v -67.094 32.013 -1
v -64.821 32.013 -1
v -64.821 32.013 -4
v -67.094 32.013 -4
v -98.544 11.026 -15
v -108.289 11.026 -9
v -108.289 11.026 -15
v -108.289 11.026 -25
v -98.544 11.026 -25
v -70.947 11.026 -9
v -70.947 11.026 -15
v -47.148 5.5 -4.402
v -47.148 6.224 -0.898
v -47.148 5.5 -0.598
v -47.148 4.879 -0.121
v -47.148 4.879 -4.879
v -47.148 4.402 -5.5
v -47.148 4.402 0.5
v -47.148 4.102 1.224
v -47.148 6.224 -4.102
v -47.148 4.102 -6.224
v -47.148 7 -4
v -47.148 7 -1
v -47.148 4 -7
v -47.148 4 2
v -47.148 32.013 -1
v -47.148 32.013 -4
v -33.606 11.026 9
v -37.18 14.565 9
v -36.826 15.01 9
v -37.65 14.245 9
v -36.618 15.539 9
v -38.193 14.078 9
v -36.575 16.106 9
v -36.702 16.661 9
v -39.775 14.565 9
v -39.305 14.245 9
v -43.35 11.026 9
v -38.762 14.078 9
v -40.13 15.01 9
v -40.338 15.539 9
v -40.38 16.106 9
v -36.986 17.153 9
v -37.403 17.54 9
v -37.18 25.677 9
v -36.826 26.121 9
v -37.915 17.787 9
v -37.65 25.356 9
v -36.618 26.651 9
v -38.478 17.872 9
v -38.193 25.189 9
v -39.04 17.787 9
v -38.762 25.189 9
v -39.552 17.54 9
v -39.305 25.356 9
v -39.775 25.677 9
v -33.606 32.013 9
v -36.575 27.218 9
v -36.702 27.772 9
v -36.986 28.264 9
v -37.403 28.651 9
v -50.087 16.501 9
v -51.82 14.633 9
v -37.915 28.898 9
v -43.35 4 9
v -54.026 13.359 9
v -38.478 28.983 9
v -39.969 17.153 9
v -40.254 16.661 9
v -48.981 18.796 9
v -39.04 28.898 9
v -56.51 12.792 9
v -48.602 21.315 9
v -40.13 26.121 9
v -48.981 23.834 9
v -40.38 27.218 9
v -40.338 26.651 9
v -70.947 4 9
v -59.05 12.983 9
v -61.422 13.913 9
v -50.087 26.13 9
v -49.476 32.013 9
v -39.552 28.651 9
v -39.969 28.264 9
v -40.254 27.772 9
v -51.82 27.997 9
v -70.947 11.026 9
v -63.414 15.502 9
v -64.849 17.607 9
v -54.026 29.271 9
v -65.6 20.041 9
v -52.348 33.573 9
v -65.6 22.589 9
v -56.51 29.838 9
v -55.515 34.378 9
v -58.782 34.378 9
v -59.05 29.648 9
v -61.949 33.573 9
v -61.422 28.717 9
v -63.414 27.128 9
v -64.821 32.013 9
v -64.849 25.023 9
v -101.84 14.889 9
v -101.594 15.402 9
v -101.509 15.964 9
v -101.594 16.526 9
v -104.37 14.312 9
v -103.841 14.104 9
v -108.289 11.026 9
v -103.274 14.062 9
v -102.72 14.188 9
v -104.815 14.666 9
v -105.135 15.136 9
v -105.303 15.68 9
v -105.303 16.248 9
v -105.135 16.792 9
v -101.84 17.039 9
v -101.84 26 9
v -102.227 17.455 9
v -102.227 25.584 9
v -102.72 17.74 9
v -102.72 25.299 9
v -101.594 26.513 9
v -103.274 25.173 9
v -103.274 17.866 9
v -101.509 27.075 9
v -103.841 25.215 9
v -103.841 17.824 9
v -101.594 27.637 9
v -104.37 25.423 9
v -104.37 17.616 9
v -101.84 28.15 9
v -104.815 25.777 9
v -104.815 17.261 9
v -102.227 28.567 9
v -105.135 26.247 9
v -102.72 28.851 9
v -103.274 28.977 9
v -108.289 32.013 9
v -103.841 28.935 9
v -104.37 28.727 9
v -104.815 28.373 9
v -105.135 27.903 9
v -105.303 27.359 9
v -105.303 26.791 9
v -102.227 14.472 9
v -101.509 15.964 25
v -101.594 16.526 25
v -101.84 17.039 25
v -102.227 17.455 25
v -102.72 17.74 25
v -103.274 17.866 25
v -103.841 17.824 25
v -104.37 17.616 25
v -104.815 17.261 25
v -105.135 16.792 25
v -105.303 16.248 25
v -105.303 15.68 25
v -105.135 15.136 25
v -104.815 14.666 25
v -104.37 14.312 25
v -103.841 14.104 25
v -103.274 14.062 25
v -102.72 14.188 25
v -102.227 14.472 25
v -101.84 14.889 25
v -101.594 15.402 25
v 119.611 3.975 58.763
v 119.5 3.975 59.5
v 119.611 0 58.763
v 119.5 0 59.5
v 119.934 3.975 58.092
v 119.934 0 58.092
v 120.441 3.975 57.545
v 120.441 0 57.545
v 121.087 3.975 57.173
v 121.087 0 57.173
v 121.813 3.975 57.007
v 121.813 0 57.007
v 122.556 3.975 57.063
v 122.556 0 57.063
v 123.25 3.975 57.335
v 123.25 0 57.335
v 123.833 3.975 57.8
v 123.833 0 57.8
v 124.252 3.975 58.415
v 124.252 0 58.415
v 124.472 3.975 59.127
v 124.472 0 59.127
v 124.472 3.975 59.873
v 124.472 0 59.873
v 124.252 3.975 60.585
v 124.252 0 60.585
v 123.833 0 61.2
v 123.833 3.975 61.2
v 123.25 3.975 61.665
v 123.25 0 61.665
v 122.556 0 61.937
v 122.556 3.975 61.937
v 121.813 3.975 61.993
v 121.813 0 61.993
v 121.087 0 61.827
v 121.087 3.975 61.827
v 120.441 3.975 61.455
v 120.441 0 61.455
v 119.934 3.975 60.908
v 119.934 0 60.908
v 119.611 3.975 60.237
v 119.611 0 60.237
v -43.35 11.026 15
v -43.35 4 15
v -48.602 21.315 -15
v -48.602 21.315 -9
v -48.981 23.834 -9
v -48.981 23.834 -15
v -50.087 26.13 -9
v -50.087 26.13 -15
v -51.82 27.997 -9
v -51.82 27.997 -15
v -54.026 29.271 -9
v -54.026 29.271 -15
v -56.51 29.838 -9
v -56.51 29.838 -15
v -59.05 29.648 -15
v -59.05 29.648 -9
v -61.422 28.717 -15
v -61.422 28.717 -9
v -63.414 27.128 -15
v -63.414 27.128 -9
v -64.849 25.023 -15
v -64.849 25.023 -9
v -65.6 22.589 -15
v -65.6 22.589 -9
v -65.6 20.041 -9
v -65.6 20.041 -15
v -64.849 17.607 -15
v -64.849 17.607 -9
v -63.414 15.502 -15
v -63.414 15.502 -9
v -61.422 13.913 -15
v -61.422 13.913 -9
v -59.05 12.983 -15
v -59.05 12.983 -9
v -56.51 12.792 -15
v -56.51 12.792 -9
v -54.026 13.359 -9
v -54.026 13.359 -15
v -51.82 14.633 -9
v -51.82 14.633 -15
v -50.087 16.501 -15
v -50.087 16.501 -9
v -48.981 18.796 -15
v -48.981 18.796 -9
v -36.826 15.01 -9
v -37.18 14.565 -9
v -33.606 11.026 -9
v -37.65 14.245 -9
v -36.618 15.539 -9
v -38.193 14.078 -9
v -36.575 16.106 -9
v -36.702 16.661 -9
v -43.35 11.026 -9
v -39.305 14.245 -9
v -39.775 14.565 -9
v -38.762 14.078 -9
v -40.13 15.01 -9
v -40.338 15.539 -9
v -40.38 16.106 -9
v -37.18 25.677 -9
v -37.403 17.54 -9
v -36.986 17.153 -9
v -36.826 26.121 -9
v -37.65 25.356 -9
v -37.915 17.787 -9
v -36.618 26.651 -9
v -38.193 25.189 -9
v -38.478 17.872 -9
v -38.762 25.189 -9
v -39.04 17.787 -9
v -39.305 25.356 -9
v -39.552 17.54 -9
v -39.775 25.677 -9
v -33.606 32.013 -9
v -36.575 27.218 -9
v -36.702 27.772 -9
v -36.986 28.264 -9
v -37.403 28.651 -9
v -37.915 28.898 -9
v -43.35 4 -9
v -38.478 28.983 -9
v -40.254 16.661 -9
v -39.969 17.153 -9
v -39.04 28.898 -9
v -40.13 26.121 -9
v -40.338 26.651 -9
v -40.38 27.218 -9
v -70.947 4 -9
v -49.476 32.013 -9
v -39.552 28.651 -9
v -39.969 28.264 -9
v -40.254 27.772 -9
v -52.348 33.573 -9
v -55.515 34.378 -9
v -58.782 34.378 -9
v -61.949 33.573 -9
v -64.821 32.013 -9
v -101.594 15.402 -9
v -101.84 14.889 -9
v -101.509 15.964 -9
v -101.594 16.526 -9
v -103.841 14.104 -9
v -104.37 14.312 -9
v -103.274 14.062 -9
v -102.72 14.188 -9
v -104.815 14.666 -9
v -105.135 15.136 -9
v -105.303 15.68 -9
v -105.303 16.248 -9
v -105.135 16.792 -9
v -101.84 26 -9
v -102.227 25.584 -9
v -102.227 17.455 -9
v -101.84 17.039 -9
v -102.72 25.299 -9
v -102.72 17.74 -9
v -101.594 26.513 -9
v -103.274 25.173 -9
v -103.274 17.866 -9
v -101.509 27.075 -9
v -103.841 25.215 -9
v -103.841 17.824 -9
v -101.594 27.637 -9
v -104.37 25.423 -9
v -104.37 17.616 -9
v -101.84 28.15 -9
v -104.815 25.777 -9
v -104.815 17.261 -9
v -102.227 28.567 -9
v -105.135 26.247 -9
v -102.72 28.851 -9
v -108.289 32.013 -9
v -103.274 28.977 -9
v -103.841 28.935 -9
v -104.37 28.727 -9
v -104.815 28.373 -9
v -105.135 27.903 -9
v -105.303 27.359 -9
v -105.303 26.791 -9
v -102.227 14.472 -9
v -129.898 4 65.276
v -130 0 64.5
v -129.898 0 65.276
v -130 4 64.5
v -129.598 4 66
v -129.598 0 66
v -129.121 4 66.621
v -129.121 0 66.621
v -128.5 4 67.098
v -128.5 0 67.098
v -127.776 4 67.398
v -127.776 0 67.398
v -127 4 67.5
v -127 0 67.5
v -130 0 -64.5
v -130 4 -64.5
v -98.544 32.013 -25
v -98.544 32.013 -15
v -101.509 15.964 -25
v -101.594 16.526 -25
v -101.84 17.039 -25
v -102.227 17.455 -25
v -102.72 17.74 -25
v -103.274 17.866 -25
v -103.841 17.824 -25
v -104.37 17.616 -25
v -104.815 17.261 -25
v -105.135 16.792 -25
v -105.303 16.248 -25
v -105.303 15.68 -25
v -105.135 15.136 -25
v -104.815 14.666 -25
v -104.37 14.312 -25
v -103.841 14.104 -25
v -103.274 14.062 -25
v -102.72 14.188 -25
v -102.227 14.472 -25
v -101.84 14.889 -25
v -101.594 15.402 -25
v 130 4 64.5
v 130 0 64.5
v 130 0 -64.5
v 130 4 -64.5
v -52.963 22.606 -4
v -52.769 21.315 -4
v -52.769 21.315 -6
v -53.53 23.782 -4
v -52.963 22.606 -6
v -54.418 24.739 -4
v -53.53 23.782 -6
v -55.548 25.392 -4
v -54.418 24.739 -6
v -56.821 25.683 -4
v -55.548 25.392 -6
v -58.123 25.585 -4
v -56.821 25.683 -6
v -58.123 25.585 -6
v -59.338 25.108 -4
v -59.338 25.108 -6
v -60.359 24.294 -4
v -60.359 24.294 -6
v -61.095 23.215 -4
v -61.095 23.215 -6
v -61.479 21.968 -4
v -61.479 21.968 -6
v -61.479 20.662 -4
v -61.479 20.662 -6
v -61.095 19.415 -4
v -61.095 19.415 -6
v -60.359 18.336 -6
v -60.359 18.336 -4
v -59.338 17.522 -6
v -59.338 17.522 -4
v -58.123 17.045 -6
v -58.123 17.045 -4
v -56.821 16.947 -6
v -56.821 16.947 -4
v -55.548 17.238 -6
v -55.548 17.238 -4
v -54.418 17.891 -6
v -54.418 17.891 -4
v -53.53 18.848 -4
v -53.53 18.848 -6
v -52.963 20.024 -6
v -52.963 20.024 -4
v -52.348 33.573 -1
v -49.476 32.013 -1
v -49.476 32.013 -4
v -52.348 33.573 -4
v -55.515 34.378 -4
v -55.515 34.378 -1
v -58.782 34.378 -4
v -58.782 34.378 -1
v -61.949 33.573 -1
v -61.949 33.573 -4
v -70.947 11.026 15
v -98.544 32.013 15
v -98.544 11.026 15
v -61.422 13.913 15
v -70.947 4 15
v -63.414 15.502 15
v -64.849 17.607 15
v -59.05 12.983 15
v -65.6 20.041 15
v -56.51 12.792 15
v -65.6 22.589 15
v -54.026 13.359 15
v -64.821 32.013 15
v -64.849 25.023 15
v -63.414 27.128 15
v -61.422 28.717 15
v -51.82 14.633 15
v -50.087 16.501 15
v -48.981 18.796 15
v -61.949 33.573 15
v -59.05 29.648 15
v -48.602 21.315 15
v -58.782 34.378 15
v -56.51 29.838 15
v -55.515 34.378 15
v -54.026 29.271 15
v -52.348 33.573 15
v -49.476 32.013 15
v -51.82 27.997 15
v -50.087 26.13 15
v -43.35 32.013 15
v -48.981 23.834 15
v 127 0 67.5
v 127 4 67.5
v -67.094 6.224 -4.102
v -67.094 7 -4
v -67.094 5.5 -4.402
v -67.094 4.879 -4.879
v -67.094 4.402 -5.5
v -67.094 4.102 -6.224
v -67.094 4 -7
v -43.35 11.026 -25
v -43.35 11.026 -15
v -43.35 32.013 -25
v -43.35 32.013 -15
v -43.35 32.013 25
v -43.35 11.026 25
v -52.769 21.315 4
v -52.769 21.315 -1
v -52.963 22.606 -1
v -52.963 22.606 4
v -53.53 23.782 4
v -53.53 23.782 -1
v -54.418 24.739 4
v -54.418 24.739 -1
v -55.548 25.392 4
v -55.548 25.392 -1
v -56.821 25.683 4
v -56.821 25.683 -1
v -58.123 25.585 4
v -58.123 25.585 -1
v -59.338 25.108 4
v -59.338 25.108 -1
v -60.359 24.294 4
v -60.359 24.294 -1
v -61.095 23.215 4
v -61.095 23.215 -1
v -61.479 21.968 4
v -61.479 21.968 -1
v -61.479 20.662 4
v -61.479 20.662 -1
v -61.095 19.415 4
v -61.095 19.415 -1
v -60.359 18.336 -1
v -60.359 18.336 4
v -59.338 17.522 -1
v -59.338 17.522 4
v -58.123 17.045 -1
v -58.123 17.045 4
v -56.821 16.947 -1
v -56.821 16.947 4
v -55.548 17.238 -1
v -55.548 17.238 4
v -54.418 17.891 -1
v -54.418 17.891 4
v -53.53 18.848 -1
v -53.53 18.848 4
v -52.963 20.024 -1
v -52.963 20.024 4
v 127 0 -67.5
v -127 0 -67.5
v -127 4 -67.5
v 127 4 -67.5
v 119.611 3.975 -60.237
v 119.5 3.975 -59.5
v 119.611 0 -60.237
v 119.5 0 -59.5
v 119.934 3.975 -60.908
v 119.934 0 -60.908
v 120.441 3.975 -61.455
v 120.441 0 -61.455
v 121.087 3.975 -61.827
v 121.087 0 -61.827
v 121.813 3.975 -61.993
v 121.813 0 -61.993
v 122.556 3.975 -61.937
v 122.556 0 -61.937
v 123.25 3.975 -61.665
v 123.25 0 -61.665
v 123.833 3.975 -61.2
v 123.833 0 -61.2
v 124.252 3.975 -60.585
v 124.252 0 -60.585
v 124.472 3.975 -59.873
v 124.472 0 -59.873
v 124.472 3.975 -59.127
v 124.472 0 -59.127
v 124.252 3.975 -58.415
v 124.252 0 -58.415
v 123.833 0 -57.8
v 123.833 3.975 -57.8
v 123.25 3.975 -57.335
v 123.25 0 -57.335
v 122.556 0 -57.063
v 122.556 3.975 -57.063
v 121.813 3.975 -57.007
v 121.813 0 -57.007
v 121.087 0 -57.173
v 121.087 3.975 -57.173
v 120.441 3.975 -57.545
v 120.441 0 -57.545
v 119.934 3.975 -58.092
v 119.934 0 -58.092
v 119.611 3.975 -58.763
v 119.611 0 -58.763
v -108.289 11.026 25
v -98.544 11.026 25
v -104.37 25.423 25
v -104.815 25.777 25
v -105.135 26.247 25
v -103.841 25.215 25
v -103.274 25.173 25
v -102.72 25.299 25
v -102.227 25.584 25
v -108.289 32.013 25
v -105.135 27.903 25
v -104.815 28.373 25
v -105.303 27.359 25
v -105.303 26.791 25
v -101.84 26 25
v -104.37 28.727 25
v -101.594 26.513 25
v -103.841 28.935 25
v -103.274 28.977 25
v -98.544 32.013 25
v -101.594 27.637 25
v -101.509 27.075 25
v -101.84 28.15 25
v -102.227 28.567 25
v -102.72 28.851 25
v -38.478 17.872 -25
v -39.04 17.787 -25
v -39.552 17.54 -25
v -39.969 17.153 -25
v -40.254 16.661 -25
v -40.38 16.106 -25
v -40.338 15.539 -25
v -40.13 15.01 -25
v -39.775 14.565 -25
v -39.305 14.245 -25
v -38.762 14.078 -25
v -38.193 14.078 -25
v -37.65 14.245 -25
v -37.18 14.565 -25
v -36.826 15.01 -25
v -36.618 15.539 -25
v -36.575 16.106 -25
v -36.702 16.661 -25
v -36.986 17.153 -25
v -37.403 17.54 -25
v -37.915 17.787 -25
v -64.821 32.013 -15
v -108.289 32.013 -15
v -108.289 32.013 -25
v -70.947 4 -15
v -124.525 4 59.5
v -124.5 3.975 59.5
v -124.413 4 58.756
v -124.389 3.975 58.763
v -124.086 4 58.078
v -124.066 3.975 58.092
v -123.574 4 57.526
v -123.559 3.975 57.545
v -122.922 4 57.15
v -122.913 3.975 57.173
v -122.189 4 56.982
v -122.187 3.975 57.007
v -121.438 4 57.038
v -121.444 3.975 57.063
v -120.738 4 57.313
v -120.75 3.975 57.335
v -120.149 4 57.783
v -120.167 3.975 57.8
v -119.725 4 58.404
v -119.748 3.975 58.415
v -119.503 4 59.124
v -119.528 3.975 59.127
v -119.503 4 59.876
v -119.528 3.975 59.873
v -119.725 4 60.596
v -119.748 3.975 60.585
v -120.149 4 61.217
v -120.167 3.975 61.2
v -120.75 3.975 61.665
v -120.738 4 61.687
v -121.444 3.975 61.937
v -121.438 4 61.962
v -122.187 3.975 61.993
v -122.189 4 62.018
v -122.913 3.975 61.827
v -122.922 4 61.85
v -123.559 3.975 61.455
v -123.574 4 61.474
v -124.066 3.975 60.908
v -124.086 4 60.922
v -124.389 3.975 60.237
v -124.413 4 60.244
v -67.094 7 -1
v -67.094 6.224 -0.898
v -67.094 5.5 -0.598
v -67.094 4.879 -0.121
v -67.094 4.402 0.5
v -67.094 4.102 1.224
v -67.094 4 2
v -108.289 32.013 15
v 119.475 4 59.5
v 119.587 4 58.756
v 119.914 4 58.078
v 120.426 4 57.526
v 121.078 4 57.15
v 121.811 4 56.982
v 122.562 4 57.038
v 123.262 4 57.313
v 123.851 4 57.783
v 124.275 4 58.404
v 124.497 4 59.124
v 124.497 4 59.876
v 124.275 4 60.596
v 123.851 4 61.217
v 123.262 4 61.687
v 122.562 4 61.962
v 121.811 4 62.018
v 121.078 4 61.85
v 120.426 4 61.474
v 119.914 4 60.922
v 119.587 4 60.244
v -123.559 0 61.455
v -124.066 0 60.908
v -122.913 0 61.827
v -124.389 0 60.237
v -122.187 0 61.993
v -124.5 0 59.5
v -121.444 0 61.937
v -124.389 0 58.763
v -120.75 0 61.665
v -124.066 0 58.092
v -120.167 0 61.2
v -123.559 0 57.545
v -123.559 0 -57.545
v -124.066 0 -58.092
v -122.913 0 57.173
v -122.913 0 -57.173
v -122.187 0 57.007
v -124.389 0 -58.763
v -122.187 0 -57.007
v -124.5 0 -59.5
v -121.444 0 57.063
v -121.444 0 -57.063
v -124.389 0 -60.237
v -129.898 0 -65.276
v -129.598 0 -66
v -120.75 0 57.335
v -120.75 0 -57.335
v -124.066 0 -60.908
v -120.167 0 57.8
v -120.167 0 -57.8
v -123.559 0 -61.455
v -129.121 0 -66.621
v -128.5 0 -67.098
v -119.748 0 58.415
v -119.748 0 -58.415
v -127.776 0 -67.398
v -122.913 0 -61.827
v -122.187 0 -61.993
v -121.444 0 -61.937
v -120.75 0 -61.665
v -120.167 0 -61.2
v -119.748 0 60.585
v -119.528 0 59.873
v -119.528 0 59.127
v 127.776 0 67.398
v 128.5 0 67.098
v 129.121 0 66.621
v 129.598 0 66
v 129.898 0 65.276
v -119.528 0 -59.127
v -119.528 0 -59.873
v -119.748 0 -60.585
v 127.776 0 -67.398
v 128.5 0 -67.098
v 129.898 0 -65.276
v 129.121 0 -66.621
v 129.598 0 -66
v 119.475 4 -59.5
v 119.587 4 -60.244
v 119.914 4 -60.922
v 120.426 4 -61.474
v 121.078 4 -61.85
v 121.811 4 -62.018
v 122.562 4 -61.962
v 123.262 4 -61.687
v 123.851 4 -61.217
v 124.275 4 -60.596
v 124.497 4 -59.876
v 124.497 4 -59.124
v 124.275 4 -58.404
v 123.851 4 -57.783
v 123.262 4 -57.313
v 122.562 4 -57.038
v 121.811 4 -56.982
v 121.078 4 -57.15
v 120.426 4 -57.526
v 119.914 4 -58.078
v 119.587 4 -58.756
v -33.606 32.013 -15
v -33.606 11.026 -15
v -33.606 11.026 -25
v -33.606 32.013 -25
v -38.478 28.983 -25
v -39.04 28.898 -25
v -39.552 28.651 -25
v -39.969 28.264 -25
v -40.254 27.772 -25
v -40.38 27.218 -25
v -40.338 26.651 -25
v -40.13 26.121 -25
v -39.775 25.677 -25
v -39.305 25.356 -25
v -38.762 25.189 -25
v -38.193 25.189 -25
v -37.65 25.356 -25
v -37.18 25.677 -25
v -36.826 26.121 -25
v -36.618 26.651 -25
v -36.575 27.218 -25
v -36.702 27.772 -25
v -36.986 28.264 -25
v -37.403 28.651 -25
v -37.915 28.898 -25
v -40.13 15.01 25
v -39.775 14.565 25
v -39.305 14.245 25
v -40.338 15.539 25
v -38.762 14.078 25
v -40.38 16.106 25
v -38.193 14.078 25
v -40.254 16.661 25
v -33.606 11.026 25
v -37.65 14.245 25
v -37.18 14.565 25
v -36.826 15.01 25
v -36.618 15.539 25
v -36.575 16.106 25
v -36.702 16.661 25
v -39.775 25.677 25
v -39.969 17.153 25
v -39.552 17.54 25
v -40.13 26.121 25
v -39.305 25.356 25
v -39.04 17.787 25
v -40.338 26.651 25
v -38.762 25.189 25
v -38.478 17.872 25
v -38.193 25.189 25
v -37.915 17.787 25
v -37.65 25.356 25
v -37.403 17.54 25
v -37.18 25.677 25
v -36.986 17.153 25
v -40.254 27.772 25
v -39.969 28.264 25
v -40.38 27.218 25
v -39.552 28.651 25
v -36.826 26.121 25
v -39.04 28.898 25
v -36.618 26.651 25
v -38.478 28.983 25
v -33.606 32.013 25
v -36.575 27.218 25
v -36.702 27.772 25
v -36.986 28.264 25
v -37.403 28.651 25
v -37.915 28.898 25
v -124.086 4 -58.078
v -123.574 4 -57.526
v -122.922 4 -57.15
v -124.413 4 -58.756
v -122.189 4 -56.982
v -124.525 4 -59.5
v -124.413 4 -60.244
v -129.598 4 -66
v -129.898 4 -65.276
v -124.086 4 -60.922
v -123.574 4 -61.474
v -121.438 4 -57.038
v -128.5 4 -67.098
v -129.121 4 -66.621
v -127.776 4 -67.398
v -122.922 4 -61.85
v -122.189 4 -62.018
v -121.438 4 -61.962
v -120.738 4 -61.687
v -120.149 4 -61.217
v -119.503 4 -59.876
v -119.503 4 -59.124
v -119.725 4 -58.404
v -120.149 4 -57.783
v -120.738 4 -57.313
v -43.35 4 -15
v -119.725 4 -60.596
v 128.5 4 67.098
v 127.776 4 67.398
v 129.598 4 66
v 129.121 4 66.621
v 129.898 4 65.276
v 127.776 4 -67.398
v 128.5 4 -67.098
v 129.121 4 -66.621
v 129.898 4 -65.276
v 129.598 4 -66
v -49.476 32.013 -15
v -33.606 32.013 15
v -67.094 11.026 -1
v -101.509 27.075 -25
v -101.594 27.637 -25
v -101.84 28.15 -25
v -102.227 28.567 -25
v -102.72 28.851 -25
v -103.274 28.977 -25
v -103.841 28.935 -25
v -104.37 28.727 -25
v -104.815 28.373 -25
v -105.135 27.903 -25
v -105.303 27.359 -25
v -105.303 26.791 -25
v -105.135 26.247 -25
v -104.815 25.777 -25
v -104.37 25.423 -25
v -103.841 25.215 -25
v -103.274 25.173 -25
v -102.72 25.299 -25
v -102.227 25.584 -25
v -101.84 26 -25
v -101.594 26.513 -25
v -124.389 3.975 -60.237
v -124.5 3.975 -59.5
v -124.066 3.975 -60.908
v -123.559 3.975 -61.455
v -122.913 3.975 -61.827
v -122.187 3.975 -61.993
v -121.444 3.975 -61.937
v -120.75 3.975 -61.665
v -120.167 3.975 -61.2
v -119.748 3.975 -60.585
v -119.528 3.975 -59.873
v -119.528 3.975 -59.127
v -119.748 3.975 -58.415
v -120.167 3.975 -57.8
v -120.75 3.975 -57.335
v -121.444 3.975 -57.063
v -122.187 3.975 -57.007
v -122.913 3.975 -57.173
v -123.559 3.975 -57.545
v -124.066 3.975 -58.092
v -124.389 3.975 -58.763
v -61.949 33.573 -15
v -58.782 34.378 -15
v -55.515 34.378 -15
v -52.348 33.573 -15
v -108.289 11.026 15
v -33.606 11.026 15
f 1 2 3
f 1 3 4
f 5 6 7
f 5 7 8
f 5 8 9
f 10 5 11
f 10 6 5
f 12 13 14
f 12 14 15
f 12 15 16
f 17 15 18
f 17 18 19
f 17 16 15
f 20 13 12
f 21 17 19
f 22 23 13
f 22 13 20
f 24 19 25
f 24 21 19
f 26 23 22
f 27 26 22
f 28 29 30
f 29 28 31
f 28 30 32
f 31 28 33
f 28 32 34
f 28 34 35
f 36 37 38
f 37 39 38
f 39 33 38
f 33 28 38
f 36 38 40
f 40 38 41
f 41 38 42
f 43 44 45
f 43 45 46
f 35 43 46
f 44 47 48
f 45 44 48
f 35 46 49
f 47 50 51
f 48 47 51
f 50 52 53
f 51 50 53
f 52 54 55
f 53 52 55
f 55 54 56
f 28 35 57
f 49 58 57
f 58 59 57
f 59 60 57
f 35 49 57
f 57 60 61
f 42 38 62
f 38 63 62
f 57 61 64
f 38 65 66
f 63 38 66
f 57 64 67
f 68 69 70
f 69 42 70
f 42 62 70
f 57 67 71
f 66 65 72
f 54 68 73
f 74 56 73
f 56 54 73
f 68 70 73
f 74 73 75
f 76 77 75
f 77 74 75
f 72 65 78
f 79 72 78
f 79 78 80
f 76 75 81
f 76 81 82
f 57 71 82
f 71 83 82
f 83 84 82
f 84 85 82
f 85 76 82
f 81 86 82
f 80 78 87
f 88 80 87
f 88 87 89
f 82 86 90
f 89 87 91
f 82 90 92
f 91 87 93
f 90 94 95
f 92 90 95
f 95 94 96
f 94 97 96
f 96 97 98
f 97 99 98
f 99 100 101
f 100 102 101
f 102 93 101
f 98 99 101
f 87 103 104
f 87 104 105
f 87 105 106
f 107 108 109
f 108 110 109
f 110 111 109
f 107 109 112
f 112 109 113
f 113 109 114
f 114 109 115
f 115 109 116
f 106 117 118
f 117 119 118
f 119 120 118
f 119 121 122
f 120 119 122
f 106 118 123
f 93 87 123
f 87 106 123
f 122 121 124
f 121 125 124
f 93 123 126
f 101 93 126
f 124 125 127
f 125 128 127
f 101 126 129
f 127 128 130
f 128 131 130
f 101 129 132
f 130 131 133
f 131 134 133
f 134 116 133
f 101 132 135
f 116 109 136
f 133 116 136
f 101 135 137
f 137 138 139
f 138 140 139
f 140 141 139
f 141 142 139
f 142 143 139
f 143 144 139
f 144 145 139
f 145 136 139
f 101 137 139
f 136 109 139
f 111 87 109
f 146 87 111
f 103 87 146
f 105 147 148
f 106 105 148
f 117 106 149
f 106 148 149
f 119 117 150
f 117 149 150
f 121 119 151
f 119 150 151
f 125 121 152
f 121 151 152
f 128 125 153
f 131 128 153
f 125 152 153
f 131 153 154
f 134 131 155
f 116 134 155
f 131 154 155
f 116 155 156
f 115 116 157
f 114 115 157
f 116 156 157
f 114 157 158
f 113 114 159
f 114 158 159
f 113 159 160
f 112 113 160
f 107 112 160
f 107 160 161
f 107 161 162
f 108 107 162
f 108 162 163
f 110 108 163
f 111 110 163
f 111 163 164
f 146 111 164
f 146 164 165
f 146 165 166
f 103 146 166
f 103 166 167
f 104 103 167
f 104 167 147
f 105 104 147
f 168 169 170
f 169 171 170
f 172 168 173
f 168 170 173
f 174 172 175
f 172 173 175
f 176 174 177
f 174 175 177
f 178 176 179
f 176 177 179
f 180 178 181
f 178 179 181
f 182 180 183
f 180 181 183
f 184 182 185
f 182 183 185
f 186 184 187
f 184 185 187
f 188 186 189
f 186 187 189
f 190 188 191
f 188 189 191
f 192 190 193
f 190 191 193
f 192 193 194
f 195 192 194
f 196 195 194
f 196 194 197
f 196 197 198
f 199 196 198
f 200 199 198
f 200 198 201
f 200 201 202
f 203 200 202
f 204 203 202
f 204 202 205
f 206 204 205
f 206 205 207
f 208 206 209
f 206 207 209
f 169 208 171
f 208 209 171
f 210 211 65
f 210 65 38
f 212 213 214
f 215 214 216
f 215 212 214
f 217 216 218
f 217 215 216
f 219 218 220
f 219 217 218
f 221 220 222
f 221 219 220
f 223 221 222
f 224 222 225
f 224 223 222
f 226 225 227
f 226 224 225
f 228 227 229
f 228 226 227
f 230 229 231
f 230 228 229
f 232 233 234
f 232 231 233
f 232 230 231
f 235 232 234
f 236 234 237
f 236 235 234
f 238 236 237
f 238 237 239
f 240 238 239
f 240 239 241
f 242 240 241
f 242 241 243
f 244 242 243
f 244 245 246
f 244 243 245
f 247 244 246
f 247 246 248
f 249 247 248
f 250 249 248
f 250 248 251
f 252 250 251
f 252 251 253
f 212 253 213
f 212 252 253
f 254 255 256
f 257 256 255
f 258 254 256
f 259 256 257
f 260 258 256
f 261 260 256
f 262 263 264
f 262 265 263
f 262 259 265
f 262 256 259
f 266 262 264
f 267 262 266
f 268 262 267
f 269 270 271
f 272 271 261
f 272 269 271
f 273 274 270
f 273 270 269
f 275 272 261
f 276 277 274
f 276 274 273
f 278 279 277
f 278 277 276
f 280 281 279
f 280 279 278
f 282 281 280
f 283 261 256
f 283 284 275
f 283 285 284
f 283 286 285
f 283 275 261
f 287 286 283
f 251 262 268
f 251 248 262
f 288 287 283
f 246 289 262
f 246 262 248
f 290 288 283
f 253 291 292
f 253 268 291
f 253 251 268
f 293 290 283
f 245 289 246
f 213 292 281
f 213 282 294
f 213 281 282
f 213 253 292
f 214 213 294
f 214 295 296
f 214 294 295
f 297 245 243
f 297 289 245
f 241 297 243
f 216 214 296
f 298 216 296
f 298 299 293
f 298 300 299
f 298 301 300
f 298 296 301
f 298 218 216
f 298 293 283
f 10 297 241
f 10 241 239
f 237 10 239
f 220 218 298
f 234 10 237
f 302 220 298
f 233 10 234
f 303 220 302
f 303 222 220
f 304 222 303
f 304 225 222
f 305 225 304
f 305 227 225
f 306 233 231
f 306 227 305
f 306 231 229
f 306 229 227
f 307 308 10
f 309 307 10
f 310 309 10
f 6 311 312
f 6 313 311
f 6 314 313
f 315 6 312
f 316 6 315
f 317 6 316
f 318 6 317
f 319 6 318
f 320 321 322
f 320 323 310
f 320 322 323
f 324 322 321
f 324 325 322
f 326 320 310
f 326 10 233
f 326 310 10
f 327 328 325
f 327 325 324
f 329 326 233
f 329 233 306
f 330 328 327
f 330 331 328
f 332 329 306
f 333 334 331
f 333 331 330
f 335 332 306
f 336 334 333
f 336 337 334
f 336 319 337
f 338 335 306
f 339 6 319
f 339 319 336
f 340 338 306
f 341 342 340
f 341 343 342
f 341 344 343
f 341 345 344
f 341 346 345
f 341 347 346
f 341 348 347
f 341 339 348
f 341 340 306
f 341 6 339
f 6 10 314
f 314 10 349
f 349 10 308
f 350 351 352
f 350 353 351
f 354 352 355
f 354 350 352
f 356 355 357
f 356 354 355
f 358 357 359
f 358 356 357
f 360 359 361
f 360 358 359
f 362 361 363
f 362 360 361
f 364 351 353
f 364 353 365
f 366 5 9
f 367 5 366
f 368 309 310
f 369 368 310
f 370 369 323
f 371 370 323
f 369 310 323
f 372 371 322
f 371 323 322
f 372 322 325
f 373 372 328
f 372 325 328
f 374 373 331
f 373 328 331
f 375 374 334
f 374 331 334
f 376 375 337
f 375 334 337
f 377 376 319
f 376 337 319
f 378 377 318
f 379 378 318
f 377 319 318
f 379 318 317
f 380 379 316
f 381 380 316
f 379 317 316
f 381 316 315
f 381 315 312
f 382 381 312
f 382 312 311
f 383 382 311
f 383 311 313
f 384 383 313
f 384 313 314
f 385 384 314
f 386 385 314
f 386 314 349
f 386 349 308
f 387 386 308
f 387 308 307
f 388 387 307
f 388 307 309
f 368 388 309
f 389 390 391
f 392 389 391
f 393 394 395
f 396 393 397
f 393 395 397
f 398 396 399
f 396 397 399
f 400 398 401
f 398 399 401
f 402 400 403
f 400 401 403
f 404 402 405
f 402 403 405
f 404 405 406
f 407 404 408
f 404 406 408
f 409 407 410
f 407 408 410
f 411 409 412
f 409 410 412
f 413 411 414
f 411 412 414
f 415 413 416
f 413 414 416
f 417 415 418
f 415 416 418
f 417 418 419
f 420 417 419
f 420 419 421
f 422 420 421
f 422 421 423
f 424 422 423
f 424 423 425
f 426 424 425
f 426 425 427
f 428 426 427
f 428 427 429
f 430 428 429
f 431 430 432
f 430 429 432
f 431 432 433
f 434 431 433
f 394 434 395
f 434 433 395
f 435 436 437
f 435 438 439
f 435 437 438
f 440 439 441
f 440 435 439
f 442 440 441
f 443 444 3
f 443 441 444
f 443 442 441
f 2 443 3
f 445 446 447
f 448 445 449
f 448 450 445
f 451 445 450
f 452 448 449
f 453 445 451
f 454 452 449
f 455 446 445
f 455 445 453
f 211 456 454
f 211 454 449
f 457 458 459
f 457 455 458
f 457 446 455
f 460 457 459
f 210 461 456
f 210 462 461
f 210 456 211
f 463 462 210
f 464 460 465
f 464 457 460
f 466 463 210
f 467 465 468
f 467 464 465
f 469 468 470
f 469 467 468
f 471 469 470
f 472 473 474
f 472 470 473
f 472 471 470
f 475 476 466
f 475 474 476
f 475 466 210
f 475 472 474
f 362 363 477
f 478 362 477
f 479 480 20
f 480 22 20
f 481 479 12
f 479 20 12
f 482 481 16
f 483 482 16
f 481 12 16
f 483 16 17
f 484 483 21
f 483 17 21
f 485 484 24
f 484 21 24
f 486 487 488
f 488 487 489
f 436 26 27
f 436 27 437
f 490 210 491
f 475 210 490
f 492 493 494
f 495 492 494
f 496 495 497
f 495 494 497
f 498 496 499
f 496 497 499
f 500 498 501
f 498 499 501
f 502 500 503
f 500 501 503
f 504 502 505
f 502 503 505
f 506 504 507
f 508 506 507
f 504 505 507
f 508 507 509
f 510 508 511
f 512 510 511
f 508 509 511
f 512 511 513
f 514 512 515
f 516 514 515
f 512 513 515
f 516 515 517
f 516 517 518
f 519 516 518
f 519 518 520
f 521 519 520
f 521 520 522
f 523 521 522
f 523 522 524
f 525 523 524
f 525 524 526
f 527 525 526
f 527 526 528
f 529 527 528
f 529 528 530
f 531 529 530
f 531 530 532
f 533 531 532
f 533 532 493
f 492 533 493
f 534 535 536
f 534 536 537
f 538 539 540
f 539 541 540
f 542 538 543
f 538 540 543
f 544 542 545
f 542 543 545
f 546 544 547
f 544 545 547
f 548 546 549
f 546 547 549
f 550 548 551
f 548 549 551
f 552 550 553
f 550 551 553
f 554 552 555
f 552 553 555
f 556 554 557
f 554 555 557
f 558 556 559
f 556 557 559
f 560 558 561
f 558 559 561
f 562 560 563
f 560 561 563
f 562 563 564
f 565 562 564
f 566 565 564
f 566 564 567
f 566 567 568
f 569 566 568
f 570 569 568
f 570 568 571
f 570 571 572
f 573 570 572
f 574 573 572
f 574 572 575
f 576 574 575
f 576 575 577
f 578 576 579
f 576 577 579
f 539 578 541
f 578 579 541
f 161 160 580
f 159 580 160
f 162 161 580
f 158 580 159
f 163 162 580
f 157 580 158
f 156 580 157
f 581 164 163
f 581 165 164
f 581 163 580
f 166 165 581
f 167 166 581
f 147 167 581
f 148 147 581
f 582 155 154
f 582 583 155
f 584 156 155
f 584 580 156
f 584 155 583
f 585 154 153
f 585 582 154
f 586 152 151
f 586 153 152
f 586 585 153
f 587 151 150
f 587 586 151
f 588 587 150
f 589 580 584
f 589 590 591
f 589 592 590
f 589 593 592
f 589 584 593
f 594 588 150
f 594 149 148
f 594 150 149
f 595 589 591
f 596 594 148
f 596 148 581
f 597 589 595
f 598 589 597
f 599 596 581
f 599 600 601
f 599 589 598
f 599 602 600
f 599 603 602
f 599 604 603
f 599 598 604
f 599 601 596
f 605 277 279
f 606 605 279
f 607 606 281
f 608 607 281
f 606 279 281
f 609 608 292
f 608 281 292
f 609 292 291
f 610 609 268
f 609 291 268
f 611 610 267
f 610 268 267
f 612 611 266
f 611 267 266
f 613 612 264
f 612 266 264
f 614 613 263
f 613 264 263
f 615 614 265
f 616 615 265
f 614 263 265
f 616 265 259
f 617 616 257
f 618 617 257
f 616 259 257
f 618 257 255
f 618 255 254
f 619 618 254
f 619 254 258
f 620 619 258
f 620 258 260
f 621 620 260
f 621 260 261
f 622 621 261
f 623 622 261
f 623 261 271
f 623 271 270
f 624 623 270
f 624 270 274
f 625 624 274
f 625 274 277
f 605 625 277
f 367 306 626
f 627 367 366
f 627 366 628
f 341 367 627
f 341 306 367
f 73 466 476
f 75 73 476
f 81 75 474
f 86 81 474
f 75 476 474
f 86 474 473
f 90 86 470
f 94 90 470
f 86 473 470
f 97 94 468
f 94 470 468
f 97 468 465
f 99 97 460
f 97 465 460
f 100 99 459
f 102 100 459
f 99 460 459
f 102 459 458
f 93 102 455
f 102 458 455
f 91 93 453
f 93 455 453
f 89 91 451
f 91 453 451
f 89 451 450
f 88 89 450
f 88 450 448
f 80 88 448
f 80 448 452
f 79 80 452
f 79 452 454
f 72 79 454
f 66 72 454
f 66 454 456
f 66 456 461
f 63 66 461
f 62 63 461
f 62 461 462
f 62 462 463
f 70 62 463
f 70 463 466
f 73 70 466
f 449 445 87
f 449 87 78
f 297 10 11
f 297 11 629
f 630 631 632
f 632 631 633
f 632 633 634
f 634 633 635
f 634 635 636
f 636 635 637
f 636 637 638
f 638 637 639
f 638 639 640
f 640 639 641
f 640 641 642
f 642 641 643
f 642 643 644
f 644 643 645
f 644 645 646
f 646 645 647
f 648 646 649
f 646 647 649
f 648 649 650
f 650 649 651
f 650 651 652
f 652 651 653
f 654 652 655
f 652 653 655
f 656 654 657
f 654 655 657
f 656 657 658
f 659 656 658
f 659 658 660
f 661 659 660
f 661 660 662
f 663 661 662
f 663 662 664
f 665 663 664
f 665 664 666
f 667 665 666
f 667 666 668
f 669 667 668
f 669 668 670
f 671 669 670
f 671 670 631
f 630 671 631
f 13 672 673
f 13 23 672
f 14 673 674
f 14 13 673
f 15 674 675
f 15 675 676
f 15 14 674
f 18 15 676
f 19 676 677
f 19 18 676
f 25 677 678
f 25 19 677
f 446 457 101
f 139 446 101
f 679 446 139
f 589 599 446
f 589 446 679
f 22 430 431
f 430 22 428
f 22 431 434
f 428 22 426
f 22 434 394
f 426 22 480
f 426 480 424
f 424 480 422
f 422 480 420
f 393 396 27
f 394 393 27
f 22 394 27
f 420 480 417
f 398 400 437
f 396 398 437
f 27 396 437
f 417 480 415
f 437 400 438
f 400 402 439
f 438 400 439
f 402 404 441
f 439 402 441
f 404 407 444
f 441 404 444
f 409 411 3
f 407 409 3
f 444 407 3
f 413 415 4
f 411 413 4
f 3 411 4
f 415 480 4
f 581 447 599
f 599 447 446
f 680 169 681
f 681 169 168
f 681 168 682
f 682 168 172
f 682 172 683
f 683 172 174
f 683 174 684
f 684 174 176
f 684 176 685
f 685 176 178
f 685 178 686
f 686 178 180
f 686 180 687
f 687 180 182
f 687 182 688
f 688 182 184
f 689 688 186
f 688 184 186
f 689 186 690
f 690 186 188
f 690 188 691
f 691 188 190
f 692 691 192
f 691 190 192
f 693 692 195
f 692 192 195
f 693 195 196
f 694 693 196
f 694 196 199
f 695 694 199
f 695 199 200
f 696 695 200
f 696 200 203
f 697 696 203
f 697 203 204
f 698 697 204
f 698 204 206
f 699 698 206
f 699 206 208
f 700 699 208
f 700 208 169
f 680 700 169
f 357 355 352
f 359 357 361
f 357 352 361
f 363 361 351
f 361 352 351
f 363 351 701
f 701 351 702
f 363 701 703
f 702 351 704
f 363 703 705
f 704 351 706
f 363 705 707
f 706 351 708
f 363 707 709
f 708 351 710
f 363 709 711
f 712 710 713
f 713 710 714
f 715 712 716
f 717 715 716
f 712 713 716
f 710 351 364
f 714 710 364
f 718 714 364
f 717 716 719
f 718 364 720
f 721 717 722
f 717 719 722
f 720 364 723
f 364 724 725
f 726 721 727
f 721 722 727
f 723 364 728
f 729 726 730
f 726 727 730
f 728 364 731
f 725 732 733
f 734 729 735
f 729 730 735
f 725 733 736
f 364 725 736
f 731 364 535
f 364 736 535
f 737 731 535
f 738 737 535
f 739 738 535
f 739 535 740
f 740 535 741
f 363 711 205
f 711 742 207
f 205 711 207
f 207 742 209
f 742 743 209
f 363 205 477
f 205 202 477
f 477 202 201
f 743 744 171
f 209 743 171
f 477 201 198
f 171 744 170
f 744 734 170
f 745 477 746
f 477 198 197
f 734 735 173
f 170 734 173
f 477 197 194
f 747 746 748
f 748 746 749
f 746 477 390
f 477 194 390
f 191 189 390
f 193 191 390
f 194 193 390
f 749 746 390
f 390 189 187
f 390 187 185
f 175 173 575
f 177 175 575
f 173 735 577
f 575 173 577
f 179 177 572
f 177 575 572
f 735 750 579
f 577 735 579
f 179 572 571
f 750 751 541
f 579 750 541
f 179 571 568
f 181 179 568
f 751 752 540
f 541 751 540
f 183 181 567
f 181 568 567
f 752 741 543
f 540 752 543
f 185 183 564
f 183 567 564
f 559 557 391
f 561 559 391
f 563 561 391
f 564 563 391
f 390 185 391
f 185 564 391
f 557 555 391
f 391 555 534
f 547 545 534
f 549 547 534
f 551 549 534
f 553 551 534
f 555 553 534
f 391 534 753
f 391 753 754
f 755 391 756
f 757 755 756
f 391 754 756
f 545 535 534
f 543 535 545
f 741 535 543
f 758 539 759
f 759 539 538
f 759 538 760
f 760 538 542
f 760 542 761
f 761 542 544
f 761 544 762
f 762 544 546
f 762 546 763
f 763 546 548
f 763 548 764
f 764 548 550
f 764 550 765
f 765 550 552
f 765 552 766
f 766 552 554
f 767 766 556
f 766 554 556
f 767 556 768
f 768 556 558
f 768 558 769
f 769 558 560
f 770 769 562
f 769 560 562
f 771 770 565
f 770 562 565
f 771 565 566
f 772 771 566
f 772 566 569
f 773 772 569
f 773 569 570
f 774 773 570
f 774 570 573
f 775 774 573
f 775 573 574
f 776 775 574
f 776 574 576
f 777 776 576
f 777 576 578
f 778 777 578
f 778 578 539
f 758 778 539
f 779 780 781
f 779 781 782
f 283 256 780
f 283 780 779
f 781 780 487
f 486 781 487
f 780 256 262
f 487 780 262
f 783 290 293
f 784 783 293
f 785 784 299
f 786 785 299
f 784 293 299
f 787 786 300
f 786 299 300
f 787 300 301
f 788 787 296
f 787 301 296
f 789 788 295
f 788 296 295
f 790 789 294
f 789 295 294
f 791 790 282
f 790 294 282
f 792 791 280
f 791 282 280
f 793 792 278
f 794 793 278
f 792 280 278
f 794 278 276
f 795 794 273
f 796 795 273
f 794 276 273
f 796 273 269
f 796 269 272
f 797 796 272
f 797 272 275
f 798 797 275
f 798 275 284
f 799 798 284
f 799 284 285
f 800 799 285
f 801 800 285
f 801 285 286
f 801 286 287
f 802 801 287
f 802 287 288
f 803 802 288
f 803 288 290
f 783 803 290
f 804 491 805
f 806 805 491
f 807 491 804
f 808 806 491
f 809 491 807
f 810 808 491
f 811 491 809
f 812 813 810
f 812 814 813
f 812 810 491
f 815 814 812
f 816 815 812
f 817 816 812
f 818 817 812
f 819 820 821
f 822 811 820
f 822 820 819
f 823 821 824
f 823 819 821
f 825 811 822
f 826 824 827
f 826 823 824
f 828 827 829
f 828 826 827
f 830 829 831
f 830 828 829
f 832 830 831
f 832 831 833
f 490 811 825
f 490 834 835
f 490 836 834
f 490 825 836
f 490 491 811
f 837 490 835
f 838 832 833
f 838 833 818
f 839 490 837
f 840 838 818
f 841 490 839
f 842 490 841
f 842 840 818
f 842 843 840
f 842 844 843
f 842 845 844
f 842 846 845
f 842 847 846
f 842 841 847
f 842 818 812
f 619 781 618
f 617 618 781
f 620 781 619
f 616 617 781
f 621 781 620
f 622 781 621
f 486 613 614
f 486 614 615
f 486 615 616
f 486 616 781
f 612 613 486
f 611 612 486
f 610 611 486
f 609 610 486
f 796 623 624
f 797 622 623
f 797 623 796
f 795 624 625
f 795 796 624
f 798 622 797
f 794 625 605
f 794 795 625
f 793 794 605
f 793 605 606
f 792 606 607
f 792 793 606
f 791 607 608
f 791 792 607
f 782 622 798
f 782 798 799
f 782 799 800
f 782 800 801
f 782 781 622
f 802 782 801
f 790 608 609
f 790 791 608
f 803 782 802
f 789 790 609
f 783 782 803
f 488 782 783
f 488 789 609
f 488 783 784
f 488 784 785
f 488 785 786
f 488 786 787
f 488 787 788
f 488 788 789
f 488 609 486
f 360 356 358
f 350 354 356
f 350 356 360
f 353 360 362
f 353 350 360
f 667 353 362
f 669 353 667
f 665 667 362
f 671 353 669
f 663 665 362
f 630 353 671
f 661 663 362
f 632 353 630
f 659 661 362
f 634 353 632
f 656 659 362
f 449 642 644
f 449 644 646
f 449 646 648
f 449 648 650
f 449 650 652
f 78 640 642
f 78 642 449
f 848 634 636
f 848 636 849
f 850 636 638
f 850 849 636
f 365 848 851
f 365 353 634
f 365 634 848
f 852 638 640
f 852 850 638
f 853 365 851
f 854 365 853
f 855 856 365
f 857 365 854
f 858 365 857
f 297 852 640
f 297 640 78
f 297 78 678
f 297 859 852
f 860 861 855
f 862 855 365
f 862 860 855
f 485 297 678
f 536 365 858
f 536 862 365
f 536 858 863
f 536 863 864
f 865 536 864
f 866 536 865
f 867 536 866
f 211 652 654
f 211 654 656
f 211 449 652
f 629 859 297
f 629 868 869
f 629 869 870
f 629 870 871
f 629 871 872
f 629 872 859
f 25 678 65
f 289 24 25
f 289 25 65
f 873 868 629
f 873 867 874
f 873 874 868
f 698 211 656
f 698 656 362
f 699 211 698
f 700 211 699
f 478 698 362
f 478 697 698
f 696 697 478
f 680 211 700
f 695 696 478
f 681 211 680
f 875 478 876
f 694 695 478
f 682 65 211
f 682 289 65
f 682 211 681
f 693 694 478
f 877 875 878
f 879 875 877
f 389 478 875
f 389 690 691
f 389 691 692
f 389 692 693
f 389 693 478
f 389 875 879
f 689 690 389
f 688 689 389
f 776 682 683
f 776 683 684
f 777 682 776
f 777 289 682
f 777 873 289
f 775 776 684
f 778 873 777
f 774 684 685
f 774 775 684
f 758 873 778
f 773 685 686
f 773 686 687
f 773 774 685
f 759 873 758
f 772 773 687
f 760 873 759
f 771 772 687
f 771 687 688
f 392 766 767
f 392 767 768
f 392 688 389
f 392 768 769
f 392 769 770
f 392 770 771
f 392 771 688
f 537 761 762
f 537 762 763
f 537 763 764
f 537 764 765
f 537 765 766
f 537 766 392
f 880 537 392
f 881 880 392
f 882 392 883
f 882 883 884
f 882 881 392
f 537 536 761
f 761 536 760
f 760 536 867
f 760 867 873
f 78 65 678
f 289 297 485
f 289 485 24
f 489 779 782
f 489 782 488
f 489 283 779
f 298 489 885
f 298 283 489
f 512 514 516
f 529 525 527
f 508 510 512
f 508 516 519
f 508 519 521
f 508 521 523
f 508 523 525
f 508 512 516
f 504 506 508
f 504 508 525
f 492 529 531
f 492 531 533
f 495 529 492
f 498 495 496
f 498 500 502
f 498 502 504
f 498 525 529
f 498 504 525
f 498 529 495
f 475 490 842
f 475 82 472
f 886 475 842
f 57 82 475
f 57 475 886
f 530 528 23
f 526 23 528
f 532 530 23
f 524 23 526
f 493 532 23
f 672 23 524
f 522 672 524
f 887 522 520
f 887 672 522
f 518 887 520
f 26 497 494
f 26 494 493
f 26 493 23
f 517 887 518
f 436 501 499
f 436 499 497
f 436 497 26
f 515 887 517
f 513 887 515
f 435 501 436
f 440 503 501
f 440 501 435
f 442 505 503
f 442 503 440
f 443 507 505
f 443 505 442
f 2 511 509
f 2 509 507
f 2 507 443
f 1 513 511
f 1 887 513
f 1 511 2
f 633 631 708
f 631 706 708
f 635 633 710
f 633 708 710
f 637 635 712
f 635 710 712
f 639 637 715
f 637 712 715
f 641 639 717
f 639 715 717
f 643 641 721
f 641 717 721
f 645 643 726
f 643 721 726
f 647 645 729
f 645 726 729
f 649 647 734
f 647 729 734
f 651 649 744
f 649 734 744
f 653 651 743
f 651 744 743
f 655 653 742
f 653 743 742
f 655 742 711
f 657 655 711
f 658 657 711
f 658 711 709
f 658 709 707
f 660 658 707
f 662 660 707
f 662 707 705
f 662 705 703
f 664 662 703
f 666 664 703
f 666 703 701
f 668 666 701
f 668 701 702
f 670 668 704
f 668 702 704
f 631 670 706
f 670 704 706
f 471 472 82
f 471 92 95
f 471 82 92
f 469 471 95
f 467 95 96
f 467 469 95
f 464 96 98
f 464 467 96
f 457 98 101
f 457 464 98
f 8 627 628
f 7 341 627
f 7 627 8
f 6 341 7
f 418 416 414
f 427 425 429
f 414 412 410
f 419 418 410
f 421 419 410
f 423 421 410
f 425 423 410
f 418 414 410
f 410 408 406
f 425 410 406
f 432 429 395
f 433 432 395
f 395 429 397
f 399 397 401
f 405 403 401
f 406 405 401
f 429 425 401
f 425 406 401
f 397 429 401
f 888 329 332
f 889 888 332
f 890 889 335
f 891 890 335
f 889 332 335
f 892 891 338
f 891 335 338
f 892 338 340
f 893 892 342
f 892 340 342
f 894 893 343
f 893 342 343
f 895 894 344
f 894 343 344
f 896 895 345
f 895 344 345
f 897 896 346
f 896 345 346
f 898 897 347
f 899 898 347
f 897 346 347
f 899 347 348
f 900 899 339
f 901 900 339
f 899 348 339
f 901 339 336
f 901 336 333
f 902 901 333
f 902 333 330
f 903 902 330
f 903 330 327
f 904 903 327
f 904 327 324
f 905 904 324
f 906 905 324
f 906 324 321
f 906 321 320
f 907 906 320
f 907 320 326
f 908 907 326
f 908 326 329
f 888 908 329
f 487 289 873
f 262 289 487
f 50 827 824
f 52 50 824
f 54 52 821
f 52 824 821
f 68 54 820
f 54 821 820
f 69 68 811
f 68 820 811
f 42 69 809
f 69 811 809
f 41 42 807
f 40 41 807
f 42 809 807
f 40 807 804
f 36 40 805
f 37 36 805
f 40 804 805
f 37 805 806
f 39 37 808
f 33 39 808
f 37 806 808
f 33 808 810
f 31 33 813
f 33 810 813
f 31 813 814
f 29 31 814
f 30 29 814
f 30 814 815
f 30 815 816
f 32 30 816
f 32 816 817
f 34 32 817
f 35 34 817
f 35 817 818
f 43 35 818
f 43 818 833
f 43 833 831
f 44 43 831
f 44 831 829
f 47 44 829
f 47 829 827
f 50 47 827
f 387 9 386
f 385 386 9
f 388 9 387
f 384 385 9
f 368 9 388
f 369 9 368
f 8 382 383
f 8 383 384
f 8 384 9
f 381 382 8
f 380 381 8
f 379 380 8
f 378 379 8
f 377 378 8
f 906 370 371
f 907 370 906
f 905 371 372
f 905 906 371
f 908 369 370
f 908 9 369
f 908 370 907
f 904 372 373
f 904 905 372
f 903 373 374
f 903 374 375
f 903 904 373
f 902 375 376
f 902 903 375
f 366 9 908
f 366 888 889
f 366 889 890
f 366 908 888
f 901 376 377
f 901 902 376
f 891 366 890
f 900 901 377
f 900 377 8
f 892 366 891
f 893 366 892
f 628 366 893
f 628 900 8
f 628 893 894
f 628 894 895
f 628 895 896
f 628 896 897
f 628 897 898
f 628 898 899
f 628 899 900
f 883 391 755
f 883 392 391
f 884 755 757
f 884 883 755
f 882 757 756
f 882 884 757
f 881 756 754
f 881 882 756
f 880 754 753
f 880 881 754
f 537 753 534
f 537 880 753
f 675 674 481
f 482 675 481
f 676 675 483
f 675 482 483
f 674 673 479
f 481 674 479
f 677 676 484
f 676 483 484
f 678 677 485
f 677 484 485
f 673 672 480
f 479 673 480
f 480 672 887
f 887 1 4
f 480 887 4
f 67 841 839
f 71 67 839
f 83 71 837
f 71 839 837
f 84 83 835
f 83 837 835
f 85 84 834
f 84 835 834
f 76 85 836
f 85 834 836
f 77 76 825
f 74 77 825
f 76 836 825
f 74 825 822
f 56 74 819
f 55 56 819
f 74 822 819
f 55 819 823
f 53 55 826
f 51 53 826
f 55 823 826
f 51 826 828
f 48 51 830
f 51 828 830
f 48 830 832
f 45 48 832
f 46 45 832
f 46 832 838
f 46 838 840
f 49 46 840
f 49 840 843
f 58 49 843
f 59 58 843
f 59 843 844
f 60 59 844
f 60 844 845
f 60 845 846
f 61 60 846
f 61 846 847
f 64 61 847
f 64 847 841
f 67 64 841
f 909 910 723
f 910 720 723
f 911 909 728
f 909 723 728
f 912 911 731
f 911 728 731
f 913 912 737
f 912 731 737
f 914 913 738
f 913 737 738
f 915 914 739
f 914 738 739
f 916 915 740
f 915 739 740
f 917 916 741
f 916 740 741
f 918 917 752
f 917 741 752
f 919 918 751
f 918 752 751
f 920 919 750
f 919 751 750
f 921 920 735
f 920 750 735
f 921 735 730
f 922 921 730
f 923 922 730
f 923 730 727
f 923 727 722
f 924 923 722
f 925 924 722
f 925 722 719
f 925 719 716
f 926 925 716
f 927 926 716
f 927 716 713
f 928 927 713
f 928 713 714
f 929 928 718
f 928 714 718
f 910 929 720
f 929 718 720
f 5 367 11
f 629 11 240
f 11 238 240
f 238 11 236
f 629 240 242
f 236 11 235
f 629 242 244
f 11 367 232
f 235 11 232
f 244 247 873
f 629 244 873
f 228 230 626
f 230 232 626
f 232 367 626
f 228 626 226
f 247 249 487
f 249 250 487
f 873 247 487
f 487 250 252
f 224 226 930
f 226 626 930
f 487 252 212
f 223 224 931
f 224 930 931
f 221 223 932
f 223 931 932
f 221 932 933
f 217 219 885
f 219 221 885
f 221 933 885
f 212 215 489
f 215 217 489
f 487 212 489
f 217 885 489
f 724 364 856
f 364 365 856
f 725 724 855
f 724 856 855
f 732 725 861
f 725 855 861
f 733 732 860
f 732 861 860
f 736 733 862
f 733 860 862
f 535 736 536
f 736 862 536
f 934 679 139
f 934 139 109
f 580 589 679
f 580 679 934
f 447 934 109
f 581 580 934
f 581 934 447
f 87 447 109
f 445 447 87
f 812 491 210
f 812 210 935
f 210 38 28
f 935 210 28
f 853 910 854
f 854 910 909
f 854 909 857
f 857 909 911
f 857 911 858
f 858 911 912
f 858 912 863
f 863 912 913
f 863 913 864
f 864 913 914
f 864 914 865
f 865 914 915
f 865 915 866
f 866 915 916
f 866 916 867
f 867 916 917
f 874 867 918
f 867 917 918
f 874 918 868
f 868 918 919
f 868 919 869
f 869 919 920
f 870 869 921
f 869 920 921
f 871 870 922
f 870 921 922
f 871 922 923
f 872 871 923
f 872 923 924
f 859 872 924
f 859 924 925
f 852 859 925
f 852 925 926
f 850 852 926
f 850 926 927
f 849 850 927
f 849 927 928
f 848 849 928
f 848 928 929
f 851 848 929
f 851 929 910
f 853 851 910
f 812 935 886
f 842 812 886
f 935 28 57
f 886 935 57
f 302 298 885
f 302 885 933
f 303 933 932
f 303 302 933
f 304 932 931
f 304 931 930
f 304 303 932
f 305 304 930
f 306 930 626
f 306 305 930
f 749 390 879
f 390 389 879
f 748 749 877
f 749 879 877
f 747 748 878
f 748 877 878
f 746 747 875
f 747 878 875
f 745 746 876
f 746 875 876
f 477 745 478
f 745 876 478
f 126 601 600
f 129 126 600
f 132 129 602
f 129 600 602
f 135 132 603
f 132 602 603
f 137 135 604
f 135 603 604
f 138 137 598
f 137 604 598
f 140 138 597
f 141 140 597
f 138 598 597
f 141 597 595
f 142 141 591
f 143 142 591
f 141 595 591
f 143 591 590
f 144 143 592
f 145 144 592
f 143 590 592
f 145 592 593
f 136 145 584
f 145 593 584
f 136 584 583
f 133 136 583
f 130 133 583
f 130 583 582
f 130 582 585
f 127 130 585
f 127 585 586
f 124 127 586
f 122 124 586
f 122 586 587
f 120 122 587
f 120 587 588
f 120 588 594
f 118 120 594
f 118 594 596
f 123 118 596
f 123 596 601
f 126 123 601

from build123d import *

# Parameters (mm, degrees)
SKETCH_1_W                      = 260
SKETCH_1_H                      = 135
EXTRUDE_1_DEPTH                 = 4
HOLE_WIZARD_5_0_5_1_D           = 5
HOLE_WIZARD_5_0_5_1_CSINK_D     = 5.05
HOLE_WIZARD_5_0_5_1_CSINK_ANGLE = 90
FILLET_1_R                      = 3
EXTRUDE_2_DEPTH                 = 15
SKETCH_5_W                      = 5
SKETCH_5_H                      = 30.479983875
SKETCH_5_W_2                    = 10
CUT_EXTRUDE_2_DEPTH             = 251.053170719
SKETCH_7_W                      = 41.194630643
SKETCH_7_H                      = 3
CUT_EXTRUDE_3_DEPTH             = 20.987549798
SKETCH_8_W                      = 13.542667964
SKETCH_8_H                      = 3
CUT_EXTRUDE_5_DEPTH             = 28.013263597
SKETCH_9_W                      = 3.853145938
SKETCH_9_H                      = 3
CUT_EXTRUDE_6_DEPTH             = 7.025713799
SKETCH_11_W                     = 9.744219549
SKETCH_11_H                     = 20.987549798
EXTRUDE_3_DEPTH                 = 10
SKETCH_12_W                     = 9.744219549
SKETCH_12_H                     = 20.987549798
EXTRUDE_4_DEPTH                 = 10
SKETCH_13_R                     = 1.907696141
CUT_EXTRUDE_7_DEPTH             = 164.233327749
SKETCH_15_R                     = 8.546756312
CUT_EXTRUDE_8_DEPTH             = 10
EXTRUDE_5_DEPTH                 = 5
EXTRUDE_5_DEPTH_BACK            = 5
SKETCH_16_R                     = 4.379825861
FILLET_2_R                      = 3


with BuildPart() as part:
    # 草图1 → 凸台-拉伸1 (new body)
    with BuildSketch(Plane(origin=(0, 0, 0), x_dir=(1, 0, 0), z_dir=(0, 1, 0))):
        Rectangle(SKETCH_1_W, SKETCH_1_H)
    extrude(amount=EXTRUDE_1_DEPTH)

    # Ø5.0 (5) 直径孔1 (through all)
    with Locations(Plane(origin=(0, 4, 0), x_dir=(1, 0, 0), z_dir=(0, 1, 0))):
        with Locations((-122, 59.5), (-122, -59.5), (122, -59.5), (122, 59.5)):
            CounterSinkHole(HOLE_WIZARD_5_0_5_1_D / 2, HOLE_WIZARD_5_0_5_1_CSINK_D / 2, counter_sink_angle=HOLE_WIZARD_5_0_5_1_CSINK_ANGLE)

    # 圆角1
    fillet_1_edges = [part.edges().sort_by_distance(p)[0] for p in [
        (130, 2, 67.5),
        (-130, 2, 67.5),
        (-130, 2, -67.5),
        (130, 2, -67.5),
    ]]
    fillet(fillet_1_edges, radius=FILLET_1_R)

    # 草图4 → 凸台-拉伸2 (add, symmetric)
    with BuildSketch(Plane.XY):
        with BuildLine():
            Line((-70.947140493, 4), (-43.349875336, 4))
            Line((-43.349875336, 4), (-43.349875336, 11.025713799))
            Line((-43.349875336, 11.025713799), (-33.605655787, 11.025713799))
            Line((-33.605655787, 11.025713799), (-33.605655787, 32.013263597))
            Line((-33.605655787, 32.013263597), (-43.349875336, 32.013263597))
            Line((-43.349875336, 32.013263597), (-49.476243699, 32.013263597))
            ThreePointArc((-49.476243699, 32.013263597), (-57.148507914, 34.479983875), (-64.82077213, 32.013263597))
            Line((-64.82077213, 32.013263597), (-98.544405649, 32.013263597))
            Line((-98.544405649, 32.013263597), (-108.288625198, 32.013263597))
            Line((-108.288625198, 32.013263597), (-108.288625198, 11.025713799))
            Line((-108.288625198, 11.025713799), (-98.544405649, 11.025713799))
            Line((-98.544405649, 11.025713799), (-70.947140493, 11.025713799))
            Line((-70.947140493, 11.025713799), (-70.947140493, 4))
        make_face()
    extrude(amount=EXTRUDE_2_DEPTH, both=True)

    # 草图5 → 切除-拉伸2 (cut, through all)
    with BuildSketch(Plane.ZY.offset(108.288625198)):
        with Locations((-6.5, 19.239991938)):
            Rectangle(SKETCH_5_W, SKETCH_5_H)
        with Locations((4, 19.239991938)):
            Rectangle(SKETCH_5_W_2, SKETCH_5_H)
    extrude(amount=-CUT_EXTRUDE_2_DEPTH, mode=Mode.SUBTRACT)

    # 草图7 → 切除-拉伸3 (cut)
    with BuildSketch(Plane(origin=(0, 32.013263597, 0), x_dir=(1, 0, 0), z_dir=(0, 1, 0))):
        with Locations((-87.691309877, 2.5)):
            Rectangle(SKETCH_7_W, SKETCH_7_H)
    extrude(amount=-CUT_EXTRUDE_3_DEPTH, mode=Mode.SUBTRACT)

    # 草图8 → 切除-拉伸5 (cut)
    with BuildSketch(Plane(origin=(0, 32.013263597, 0), x_dir=(1, 0, 0), z_dir=(0, 1, 0))):
        with Locations((-40.376989769, 2.5)):
            Rectangle(SKETCH_8_W, SKETCH_8_H)
    extrude(amount=-CUT_EXTRUDE_5_DEPTH, mode=Mode.SUBTRACT)

    # 草图9 → 切除-拉伸6 (cut)
    with BuildSketch(Plane(origin=(0, 11.025713799, 0), x_dir=(1, 0, 0), z_dir=(0, 1, 0))):
        with Locations((-69.020567524, 2.5)):
            Rectangle(SKETCH_9_W, SKETCH_9_H)
    extrude(amount=-CUT_EXTRUDE_6_DEPTH, mode=Mode.SUBTRACT)

    # 草图11 → 凸台-拉伸3 (add)
    with BuildSketch(Plane.XY.offset(15)):
        with Locations((-38.477765562, 21.519488698)):
            Rectangle(SKETCH_11_W, SKETCH_11_H)
        with Locations((-103.416515424, 21.519488698)):
            Rectangle(SKETCH_11_W, SKETCH_11_H)
    extrude(amount=EXTRUDE_3_DEPTH)

    # 草图12 → 凸台-拉伸4 (add)
    with BuildSketch(Plane(origin=(0, 0, -15), x_dir=(-1, 0, 0), z_dir=(0, 0, -1))):
        with Locations((38.477765562, 21.519488698)):
            Rectangle(SKETCH_12_W, SKETCH_12_H)
        with Locations((103.416515424, 21.519488698)):
            Rectangle(SKETCH_12_W, SKETCH_12_H)
    extrude(amount=EXTRUDE_4_DEPTH)

    # 草图13 → 切除-拉伸7 (cut, through all)
    with BuildSketch(Plane.XY.offset(25)):
        with Locations(Location((-38.477765562, 27.075045448, 0), (0, 0, 90))):
            Circle(SKETCH_13_R)
        with Locations(Location((-38.477765562, 15.963931947, 0), (0, 0, 90))):
            Circle(SKETCH_13_R)
        with Locations((-103.416515423, 15.963931947)):
            Circle(SKETCH_13_R)
        with Locations((-103.416515423, 27.075045448)):
            Circle(SKETCH_13_R)
    extrude(amount=-CUT_EXTRUDE_7_DEPTH, mode=Mode.SUBTRACT)

    # 草图15 → 切除-拉伸8 (cut)
    with BuildSketch(Plane.XY.offset(15)):
        with Locations((-57.148507914, 21.315064512)):
            Circle(SKETCH_15_R)
    cut_extrude_8 = extrude(amount=-CUT_EXTRUDE_8_DEPTH, mode=Mode.SUBTRACT)

    # 镜向3: 切除-拉伸8 across plane
    add(cut_extrude_8.mirror(Plane.XY), mode=Mode.SUBTRACT)

    # 草图16 → 凸台-拉伸5 (add, two sides: drawn at the far end of the back side and taken through both)
    with BuildSketch(Plane.XY.offset(-1).offset(-EXTRUDE_5_DEPTH_BACK)):
        with Locations((-57.148507914, 21.315064512)):
            Circle(SKETCH_16_R)
    extrude(amount=EXTRUDE_5_DEPTH + EXTRUDE_5_DEPTH_BACK)

    # 圆角2
    fillet_2_edges = [part.edges().sort_by_distance(p)[0] for p in [
        (-57.121159153, 4, -4),
        (-57.121159153, 4, -1),
    ]]
    fillet(fillet_2_edges, radius=FILLET_2_R)


solid = part.part
